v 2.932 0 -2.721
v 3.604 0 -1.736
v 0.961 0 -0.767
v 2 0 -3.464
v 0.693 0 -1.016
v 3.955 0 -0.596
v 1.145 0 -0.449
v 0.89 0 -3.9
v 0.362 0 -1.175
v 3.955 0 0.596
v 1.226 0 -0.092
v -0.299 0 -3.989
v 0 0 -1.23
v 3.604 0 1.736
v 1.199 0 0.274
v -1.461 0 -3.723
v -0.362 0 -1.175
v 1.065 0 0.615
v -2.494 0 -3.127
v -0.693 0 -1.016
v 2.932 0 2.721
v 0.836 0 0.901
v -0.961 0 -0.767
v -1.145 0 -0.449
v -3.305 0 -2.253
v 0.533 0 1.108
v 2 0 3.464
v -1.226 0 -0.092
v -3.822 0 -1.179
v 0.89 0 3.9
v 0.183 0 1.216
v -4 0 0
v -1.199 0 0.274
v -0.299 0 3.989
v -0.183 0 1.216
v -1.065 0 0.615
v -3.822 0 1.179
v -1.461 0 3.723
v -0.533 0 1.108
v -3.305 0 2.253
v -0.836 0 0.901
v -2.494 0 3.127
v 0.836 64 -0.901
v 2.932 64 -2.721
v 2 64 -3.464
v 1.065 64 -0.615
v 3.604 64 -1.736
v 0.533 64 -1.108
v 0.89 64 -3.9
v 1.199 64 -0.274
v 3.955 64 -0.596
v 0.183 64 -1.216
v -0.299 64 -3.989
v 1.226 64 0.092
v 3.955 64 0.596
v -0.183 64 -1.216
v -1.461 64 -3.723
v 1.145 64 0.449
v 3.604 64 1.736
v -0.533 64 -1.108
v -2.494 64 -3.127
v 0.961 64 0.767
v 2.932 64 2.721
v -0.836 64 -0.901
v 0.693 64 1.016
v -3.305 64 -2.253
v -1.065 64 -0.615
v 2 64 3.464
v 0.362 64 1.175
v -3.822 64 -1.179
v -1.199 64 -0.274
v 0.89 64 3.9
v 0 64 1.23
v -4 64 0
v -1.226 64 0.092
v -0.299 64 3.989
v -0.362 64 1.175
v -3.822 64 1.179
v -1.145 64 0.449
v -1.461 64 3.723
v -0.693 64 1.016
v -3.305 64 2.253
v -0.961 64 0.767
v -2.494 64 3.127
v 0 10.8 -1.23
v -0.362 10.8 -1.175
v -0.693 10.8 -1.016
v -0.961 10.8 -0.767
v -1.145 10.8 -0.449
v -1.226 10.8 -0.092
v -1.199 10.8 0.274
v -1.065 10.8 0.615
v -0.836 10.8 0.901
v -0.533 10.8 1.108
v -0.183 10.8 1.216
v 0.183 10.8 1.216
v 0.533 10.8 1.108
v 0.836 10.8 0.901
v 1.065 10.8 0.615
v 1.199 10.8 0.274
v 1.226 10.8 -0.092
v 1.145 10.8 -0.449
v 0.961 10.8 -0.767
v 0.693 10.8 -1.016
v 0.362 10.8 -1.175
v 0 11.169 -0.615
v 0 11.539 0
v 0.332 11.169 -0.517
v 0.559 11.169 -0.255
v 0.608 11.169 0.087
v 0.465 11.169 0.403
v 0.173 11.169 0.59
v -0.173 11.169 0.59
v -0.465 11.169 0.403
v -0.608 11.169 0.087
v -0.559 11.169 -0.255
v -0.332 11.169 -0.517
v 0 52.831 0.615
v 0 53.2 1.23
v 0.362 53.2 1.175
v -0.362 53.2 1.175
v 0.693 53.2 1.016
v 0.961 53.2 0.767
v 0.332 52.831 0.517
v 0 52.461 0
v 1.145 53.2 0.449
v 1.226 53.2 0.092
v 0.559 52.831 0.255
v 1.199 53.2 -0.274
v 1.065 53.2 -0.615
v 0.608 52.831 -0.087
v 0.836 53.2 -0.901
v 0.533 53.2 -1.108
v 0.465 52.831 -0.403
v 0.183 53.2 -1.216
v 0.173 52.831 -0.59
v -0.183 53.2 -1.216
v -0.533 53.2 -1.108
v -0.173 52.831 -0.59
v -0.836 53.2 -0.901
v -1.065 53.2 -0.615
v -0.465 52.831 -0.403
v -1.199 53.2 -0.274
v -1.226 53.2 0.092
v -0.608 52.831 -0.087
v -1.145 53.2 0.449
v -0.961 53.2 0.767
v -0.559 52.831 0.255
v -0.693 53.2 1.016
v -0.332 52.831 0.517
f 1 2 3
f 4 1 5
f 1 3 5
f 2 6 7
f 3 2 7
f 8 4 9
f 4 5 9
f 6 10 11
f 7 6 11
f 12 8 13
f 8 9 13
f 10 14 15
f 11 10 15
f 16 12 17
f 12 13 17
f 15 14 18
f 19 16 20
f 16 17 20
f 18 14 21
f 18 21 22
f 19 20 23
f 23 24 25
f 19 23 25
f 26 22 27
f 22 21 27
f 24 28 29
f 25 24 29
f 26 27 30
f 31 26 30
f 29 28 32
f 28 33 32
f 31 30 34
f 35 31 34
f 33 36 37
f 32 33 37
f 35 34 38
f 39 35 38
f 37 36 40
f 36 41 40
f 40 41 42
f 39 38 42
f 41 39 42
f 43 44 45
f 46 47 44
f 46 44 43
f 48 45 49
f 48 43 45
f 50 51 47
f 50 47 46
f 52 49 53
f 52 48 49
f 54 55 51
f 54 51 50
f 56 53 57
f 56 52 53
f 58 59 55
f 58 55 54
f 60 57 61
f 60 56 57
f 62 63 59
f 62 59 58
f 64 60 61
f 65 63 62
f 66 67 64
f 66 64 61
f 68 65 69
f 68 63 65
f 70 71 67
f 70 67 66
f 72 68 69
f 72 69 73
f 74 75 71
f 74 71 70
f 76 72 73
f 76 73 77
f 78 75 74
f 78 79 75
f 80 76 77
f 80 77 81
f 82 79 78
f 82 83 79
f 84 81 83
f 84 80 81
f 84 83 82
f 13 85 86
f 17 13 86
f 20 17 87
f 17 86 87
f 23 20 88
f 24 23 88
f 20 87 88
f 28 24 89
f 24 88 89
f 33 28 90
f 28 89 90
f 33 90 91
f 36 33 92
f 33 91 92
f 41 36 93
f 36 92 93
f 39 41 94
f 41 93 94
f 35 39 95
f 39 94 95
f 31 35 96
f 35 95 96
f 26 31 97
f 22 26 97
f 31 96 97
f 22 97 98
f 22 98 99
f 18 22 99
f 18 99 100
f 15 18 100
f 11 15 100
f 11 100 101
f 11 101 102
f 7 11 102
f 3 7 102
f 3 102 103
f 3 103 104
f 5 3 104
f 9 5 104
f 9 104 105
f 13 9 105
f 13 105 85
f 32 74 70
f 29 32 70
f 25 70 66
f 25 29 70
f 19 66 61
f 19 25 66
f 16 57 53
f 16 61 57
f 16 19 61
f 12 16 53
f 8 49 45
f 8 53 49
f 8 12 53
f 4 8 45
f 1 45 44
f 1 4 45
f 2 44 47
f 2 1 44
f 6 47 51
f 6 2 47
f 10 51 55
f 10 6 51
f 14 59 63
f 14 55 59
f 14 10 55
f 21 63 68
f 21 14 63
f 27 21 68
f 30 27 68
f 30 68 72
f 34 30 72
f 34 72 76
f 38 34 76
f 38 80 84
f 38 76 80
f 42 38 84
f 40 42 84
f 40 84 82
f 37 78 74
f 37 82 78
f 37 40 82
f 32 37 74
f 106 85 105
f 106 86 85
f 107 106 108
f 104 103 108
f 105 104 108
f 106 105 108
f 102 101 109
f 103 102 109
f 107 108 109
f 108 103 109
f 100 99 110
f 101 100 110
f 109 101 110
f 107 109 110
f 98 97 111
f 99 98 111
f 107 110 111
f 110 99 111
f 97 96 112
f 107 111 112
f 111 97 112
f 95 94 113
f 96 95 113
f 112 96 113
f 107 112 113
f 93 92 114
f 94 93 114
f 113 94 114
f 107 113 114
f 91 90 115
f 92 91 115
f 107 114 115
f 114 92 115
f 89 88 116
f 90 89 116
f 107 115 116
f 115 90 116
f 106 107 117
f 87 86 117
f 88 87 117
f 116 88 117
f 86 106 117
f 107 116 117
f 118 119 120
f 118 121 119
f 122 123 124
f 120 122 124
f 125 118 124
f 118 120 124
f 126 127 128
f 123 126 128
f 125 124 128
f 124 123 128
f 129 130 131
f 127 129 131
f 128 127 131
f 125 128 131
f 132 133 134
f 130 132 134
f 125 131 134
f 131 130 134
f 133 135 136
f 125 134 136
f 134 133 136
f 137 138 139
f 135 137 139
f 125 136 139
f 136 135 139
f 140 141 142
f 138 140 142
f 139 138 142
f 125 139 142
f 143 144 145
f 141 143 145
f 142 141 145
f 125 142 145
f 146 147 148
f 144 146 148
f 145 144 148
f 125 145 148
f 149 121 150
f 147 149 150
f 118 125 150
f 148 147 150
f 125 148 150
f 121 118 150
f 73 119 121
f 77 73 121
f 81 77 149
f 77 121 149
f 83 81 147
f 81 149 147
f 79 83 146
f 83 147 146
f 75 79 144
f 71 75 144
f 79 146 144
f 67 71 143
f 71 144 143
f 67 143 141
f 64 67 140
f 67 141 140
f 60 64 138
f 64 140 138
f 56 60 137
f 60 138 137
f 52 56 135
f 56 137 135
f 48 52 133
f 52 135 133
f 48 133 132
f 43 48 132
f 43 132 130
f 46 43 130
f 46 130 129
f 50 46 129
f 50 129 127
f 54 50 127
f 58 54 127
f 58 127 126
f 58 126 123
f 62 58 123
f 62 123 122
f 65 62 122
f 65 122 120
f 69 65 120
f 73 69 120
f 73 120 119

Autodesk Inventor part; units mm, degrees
ref_plane "YZ Plane" through (0, 0, 0) normal (1, 0, 0) x (0, 1, 0)
ref_plane "XZ Plane" through (0, 0, 0) normal (0, 1, 0) x (-1, 0, 0)
ref_plane "XY Plane" through (0, 0, 0) normal (0, 0, 1) x (1, 0, 0)
sketch "Sketch1" plane through (0, 0, 0) normal (0, 1, 0) x (-1, 0, 0)
  circle A0 centre (0, 0) radius 4
  dimension "d0" = 8
extrude "Extrusion1" add sketch "Sketch1" along normal blind 64
sketch "Sketch2" plane through (0, 64, 0) normal (0, 1, 0) x (1, 0, 0)
  point P0 (0, 0)
  point P1 (0, 0)
sketch "Sketch3" plane through (0, 0, 0) normal (0, -1, 0) x (1, 0, 0)
  point P0 (0, 0)
  point P1 (0, 0)
hole "Hole1" at (0, 64, 0) direction (0, -1, 0) diameter 2.459 depth 10.8 tip angle 118 thread size "M3x0.5" class "6H" standard "ISO Metric profile"
hole "Hole2" at (0, 0, 0) direction (0, 1, 0) diameter 2.459 depth 10.8 tip angle 118 thread size "M3x0.5" class "6H" standard "ISO Metric profile"
properties part number "rod"
